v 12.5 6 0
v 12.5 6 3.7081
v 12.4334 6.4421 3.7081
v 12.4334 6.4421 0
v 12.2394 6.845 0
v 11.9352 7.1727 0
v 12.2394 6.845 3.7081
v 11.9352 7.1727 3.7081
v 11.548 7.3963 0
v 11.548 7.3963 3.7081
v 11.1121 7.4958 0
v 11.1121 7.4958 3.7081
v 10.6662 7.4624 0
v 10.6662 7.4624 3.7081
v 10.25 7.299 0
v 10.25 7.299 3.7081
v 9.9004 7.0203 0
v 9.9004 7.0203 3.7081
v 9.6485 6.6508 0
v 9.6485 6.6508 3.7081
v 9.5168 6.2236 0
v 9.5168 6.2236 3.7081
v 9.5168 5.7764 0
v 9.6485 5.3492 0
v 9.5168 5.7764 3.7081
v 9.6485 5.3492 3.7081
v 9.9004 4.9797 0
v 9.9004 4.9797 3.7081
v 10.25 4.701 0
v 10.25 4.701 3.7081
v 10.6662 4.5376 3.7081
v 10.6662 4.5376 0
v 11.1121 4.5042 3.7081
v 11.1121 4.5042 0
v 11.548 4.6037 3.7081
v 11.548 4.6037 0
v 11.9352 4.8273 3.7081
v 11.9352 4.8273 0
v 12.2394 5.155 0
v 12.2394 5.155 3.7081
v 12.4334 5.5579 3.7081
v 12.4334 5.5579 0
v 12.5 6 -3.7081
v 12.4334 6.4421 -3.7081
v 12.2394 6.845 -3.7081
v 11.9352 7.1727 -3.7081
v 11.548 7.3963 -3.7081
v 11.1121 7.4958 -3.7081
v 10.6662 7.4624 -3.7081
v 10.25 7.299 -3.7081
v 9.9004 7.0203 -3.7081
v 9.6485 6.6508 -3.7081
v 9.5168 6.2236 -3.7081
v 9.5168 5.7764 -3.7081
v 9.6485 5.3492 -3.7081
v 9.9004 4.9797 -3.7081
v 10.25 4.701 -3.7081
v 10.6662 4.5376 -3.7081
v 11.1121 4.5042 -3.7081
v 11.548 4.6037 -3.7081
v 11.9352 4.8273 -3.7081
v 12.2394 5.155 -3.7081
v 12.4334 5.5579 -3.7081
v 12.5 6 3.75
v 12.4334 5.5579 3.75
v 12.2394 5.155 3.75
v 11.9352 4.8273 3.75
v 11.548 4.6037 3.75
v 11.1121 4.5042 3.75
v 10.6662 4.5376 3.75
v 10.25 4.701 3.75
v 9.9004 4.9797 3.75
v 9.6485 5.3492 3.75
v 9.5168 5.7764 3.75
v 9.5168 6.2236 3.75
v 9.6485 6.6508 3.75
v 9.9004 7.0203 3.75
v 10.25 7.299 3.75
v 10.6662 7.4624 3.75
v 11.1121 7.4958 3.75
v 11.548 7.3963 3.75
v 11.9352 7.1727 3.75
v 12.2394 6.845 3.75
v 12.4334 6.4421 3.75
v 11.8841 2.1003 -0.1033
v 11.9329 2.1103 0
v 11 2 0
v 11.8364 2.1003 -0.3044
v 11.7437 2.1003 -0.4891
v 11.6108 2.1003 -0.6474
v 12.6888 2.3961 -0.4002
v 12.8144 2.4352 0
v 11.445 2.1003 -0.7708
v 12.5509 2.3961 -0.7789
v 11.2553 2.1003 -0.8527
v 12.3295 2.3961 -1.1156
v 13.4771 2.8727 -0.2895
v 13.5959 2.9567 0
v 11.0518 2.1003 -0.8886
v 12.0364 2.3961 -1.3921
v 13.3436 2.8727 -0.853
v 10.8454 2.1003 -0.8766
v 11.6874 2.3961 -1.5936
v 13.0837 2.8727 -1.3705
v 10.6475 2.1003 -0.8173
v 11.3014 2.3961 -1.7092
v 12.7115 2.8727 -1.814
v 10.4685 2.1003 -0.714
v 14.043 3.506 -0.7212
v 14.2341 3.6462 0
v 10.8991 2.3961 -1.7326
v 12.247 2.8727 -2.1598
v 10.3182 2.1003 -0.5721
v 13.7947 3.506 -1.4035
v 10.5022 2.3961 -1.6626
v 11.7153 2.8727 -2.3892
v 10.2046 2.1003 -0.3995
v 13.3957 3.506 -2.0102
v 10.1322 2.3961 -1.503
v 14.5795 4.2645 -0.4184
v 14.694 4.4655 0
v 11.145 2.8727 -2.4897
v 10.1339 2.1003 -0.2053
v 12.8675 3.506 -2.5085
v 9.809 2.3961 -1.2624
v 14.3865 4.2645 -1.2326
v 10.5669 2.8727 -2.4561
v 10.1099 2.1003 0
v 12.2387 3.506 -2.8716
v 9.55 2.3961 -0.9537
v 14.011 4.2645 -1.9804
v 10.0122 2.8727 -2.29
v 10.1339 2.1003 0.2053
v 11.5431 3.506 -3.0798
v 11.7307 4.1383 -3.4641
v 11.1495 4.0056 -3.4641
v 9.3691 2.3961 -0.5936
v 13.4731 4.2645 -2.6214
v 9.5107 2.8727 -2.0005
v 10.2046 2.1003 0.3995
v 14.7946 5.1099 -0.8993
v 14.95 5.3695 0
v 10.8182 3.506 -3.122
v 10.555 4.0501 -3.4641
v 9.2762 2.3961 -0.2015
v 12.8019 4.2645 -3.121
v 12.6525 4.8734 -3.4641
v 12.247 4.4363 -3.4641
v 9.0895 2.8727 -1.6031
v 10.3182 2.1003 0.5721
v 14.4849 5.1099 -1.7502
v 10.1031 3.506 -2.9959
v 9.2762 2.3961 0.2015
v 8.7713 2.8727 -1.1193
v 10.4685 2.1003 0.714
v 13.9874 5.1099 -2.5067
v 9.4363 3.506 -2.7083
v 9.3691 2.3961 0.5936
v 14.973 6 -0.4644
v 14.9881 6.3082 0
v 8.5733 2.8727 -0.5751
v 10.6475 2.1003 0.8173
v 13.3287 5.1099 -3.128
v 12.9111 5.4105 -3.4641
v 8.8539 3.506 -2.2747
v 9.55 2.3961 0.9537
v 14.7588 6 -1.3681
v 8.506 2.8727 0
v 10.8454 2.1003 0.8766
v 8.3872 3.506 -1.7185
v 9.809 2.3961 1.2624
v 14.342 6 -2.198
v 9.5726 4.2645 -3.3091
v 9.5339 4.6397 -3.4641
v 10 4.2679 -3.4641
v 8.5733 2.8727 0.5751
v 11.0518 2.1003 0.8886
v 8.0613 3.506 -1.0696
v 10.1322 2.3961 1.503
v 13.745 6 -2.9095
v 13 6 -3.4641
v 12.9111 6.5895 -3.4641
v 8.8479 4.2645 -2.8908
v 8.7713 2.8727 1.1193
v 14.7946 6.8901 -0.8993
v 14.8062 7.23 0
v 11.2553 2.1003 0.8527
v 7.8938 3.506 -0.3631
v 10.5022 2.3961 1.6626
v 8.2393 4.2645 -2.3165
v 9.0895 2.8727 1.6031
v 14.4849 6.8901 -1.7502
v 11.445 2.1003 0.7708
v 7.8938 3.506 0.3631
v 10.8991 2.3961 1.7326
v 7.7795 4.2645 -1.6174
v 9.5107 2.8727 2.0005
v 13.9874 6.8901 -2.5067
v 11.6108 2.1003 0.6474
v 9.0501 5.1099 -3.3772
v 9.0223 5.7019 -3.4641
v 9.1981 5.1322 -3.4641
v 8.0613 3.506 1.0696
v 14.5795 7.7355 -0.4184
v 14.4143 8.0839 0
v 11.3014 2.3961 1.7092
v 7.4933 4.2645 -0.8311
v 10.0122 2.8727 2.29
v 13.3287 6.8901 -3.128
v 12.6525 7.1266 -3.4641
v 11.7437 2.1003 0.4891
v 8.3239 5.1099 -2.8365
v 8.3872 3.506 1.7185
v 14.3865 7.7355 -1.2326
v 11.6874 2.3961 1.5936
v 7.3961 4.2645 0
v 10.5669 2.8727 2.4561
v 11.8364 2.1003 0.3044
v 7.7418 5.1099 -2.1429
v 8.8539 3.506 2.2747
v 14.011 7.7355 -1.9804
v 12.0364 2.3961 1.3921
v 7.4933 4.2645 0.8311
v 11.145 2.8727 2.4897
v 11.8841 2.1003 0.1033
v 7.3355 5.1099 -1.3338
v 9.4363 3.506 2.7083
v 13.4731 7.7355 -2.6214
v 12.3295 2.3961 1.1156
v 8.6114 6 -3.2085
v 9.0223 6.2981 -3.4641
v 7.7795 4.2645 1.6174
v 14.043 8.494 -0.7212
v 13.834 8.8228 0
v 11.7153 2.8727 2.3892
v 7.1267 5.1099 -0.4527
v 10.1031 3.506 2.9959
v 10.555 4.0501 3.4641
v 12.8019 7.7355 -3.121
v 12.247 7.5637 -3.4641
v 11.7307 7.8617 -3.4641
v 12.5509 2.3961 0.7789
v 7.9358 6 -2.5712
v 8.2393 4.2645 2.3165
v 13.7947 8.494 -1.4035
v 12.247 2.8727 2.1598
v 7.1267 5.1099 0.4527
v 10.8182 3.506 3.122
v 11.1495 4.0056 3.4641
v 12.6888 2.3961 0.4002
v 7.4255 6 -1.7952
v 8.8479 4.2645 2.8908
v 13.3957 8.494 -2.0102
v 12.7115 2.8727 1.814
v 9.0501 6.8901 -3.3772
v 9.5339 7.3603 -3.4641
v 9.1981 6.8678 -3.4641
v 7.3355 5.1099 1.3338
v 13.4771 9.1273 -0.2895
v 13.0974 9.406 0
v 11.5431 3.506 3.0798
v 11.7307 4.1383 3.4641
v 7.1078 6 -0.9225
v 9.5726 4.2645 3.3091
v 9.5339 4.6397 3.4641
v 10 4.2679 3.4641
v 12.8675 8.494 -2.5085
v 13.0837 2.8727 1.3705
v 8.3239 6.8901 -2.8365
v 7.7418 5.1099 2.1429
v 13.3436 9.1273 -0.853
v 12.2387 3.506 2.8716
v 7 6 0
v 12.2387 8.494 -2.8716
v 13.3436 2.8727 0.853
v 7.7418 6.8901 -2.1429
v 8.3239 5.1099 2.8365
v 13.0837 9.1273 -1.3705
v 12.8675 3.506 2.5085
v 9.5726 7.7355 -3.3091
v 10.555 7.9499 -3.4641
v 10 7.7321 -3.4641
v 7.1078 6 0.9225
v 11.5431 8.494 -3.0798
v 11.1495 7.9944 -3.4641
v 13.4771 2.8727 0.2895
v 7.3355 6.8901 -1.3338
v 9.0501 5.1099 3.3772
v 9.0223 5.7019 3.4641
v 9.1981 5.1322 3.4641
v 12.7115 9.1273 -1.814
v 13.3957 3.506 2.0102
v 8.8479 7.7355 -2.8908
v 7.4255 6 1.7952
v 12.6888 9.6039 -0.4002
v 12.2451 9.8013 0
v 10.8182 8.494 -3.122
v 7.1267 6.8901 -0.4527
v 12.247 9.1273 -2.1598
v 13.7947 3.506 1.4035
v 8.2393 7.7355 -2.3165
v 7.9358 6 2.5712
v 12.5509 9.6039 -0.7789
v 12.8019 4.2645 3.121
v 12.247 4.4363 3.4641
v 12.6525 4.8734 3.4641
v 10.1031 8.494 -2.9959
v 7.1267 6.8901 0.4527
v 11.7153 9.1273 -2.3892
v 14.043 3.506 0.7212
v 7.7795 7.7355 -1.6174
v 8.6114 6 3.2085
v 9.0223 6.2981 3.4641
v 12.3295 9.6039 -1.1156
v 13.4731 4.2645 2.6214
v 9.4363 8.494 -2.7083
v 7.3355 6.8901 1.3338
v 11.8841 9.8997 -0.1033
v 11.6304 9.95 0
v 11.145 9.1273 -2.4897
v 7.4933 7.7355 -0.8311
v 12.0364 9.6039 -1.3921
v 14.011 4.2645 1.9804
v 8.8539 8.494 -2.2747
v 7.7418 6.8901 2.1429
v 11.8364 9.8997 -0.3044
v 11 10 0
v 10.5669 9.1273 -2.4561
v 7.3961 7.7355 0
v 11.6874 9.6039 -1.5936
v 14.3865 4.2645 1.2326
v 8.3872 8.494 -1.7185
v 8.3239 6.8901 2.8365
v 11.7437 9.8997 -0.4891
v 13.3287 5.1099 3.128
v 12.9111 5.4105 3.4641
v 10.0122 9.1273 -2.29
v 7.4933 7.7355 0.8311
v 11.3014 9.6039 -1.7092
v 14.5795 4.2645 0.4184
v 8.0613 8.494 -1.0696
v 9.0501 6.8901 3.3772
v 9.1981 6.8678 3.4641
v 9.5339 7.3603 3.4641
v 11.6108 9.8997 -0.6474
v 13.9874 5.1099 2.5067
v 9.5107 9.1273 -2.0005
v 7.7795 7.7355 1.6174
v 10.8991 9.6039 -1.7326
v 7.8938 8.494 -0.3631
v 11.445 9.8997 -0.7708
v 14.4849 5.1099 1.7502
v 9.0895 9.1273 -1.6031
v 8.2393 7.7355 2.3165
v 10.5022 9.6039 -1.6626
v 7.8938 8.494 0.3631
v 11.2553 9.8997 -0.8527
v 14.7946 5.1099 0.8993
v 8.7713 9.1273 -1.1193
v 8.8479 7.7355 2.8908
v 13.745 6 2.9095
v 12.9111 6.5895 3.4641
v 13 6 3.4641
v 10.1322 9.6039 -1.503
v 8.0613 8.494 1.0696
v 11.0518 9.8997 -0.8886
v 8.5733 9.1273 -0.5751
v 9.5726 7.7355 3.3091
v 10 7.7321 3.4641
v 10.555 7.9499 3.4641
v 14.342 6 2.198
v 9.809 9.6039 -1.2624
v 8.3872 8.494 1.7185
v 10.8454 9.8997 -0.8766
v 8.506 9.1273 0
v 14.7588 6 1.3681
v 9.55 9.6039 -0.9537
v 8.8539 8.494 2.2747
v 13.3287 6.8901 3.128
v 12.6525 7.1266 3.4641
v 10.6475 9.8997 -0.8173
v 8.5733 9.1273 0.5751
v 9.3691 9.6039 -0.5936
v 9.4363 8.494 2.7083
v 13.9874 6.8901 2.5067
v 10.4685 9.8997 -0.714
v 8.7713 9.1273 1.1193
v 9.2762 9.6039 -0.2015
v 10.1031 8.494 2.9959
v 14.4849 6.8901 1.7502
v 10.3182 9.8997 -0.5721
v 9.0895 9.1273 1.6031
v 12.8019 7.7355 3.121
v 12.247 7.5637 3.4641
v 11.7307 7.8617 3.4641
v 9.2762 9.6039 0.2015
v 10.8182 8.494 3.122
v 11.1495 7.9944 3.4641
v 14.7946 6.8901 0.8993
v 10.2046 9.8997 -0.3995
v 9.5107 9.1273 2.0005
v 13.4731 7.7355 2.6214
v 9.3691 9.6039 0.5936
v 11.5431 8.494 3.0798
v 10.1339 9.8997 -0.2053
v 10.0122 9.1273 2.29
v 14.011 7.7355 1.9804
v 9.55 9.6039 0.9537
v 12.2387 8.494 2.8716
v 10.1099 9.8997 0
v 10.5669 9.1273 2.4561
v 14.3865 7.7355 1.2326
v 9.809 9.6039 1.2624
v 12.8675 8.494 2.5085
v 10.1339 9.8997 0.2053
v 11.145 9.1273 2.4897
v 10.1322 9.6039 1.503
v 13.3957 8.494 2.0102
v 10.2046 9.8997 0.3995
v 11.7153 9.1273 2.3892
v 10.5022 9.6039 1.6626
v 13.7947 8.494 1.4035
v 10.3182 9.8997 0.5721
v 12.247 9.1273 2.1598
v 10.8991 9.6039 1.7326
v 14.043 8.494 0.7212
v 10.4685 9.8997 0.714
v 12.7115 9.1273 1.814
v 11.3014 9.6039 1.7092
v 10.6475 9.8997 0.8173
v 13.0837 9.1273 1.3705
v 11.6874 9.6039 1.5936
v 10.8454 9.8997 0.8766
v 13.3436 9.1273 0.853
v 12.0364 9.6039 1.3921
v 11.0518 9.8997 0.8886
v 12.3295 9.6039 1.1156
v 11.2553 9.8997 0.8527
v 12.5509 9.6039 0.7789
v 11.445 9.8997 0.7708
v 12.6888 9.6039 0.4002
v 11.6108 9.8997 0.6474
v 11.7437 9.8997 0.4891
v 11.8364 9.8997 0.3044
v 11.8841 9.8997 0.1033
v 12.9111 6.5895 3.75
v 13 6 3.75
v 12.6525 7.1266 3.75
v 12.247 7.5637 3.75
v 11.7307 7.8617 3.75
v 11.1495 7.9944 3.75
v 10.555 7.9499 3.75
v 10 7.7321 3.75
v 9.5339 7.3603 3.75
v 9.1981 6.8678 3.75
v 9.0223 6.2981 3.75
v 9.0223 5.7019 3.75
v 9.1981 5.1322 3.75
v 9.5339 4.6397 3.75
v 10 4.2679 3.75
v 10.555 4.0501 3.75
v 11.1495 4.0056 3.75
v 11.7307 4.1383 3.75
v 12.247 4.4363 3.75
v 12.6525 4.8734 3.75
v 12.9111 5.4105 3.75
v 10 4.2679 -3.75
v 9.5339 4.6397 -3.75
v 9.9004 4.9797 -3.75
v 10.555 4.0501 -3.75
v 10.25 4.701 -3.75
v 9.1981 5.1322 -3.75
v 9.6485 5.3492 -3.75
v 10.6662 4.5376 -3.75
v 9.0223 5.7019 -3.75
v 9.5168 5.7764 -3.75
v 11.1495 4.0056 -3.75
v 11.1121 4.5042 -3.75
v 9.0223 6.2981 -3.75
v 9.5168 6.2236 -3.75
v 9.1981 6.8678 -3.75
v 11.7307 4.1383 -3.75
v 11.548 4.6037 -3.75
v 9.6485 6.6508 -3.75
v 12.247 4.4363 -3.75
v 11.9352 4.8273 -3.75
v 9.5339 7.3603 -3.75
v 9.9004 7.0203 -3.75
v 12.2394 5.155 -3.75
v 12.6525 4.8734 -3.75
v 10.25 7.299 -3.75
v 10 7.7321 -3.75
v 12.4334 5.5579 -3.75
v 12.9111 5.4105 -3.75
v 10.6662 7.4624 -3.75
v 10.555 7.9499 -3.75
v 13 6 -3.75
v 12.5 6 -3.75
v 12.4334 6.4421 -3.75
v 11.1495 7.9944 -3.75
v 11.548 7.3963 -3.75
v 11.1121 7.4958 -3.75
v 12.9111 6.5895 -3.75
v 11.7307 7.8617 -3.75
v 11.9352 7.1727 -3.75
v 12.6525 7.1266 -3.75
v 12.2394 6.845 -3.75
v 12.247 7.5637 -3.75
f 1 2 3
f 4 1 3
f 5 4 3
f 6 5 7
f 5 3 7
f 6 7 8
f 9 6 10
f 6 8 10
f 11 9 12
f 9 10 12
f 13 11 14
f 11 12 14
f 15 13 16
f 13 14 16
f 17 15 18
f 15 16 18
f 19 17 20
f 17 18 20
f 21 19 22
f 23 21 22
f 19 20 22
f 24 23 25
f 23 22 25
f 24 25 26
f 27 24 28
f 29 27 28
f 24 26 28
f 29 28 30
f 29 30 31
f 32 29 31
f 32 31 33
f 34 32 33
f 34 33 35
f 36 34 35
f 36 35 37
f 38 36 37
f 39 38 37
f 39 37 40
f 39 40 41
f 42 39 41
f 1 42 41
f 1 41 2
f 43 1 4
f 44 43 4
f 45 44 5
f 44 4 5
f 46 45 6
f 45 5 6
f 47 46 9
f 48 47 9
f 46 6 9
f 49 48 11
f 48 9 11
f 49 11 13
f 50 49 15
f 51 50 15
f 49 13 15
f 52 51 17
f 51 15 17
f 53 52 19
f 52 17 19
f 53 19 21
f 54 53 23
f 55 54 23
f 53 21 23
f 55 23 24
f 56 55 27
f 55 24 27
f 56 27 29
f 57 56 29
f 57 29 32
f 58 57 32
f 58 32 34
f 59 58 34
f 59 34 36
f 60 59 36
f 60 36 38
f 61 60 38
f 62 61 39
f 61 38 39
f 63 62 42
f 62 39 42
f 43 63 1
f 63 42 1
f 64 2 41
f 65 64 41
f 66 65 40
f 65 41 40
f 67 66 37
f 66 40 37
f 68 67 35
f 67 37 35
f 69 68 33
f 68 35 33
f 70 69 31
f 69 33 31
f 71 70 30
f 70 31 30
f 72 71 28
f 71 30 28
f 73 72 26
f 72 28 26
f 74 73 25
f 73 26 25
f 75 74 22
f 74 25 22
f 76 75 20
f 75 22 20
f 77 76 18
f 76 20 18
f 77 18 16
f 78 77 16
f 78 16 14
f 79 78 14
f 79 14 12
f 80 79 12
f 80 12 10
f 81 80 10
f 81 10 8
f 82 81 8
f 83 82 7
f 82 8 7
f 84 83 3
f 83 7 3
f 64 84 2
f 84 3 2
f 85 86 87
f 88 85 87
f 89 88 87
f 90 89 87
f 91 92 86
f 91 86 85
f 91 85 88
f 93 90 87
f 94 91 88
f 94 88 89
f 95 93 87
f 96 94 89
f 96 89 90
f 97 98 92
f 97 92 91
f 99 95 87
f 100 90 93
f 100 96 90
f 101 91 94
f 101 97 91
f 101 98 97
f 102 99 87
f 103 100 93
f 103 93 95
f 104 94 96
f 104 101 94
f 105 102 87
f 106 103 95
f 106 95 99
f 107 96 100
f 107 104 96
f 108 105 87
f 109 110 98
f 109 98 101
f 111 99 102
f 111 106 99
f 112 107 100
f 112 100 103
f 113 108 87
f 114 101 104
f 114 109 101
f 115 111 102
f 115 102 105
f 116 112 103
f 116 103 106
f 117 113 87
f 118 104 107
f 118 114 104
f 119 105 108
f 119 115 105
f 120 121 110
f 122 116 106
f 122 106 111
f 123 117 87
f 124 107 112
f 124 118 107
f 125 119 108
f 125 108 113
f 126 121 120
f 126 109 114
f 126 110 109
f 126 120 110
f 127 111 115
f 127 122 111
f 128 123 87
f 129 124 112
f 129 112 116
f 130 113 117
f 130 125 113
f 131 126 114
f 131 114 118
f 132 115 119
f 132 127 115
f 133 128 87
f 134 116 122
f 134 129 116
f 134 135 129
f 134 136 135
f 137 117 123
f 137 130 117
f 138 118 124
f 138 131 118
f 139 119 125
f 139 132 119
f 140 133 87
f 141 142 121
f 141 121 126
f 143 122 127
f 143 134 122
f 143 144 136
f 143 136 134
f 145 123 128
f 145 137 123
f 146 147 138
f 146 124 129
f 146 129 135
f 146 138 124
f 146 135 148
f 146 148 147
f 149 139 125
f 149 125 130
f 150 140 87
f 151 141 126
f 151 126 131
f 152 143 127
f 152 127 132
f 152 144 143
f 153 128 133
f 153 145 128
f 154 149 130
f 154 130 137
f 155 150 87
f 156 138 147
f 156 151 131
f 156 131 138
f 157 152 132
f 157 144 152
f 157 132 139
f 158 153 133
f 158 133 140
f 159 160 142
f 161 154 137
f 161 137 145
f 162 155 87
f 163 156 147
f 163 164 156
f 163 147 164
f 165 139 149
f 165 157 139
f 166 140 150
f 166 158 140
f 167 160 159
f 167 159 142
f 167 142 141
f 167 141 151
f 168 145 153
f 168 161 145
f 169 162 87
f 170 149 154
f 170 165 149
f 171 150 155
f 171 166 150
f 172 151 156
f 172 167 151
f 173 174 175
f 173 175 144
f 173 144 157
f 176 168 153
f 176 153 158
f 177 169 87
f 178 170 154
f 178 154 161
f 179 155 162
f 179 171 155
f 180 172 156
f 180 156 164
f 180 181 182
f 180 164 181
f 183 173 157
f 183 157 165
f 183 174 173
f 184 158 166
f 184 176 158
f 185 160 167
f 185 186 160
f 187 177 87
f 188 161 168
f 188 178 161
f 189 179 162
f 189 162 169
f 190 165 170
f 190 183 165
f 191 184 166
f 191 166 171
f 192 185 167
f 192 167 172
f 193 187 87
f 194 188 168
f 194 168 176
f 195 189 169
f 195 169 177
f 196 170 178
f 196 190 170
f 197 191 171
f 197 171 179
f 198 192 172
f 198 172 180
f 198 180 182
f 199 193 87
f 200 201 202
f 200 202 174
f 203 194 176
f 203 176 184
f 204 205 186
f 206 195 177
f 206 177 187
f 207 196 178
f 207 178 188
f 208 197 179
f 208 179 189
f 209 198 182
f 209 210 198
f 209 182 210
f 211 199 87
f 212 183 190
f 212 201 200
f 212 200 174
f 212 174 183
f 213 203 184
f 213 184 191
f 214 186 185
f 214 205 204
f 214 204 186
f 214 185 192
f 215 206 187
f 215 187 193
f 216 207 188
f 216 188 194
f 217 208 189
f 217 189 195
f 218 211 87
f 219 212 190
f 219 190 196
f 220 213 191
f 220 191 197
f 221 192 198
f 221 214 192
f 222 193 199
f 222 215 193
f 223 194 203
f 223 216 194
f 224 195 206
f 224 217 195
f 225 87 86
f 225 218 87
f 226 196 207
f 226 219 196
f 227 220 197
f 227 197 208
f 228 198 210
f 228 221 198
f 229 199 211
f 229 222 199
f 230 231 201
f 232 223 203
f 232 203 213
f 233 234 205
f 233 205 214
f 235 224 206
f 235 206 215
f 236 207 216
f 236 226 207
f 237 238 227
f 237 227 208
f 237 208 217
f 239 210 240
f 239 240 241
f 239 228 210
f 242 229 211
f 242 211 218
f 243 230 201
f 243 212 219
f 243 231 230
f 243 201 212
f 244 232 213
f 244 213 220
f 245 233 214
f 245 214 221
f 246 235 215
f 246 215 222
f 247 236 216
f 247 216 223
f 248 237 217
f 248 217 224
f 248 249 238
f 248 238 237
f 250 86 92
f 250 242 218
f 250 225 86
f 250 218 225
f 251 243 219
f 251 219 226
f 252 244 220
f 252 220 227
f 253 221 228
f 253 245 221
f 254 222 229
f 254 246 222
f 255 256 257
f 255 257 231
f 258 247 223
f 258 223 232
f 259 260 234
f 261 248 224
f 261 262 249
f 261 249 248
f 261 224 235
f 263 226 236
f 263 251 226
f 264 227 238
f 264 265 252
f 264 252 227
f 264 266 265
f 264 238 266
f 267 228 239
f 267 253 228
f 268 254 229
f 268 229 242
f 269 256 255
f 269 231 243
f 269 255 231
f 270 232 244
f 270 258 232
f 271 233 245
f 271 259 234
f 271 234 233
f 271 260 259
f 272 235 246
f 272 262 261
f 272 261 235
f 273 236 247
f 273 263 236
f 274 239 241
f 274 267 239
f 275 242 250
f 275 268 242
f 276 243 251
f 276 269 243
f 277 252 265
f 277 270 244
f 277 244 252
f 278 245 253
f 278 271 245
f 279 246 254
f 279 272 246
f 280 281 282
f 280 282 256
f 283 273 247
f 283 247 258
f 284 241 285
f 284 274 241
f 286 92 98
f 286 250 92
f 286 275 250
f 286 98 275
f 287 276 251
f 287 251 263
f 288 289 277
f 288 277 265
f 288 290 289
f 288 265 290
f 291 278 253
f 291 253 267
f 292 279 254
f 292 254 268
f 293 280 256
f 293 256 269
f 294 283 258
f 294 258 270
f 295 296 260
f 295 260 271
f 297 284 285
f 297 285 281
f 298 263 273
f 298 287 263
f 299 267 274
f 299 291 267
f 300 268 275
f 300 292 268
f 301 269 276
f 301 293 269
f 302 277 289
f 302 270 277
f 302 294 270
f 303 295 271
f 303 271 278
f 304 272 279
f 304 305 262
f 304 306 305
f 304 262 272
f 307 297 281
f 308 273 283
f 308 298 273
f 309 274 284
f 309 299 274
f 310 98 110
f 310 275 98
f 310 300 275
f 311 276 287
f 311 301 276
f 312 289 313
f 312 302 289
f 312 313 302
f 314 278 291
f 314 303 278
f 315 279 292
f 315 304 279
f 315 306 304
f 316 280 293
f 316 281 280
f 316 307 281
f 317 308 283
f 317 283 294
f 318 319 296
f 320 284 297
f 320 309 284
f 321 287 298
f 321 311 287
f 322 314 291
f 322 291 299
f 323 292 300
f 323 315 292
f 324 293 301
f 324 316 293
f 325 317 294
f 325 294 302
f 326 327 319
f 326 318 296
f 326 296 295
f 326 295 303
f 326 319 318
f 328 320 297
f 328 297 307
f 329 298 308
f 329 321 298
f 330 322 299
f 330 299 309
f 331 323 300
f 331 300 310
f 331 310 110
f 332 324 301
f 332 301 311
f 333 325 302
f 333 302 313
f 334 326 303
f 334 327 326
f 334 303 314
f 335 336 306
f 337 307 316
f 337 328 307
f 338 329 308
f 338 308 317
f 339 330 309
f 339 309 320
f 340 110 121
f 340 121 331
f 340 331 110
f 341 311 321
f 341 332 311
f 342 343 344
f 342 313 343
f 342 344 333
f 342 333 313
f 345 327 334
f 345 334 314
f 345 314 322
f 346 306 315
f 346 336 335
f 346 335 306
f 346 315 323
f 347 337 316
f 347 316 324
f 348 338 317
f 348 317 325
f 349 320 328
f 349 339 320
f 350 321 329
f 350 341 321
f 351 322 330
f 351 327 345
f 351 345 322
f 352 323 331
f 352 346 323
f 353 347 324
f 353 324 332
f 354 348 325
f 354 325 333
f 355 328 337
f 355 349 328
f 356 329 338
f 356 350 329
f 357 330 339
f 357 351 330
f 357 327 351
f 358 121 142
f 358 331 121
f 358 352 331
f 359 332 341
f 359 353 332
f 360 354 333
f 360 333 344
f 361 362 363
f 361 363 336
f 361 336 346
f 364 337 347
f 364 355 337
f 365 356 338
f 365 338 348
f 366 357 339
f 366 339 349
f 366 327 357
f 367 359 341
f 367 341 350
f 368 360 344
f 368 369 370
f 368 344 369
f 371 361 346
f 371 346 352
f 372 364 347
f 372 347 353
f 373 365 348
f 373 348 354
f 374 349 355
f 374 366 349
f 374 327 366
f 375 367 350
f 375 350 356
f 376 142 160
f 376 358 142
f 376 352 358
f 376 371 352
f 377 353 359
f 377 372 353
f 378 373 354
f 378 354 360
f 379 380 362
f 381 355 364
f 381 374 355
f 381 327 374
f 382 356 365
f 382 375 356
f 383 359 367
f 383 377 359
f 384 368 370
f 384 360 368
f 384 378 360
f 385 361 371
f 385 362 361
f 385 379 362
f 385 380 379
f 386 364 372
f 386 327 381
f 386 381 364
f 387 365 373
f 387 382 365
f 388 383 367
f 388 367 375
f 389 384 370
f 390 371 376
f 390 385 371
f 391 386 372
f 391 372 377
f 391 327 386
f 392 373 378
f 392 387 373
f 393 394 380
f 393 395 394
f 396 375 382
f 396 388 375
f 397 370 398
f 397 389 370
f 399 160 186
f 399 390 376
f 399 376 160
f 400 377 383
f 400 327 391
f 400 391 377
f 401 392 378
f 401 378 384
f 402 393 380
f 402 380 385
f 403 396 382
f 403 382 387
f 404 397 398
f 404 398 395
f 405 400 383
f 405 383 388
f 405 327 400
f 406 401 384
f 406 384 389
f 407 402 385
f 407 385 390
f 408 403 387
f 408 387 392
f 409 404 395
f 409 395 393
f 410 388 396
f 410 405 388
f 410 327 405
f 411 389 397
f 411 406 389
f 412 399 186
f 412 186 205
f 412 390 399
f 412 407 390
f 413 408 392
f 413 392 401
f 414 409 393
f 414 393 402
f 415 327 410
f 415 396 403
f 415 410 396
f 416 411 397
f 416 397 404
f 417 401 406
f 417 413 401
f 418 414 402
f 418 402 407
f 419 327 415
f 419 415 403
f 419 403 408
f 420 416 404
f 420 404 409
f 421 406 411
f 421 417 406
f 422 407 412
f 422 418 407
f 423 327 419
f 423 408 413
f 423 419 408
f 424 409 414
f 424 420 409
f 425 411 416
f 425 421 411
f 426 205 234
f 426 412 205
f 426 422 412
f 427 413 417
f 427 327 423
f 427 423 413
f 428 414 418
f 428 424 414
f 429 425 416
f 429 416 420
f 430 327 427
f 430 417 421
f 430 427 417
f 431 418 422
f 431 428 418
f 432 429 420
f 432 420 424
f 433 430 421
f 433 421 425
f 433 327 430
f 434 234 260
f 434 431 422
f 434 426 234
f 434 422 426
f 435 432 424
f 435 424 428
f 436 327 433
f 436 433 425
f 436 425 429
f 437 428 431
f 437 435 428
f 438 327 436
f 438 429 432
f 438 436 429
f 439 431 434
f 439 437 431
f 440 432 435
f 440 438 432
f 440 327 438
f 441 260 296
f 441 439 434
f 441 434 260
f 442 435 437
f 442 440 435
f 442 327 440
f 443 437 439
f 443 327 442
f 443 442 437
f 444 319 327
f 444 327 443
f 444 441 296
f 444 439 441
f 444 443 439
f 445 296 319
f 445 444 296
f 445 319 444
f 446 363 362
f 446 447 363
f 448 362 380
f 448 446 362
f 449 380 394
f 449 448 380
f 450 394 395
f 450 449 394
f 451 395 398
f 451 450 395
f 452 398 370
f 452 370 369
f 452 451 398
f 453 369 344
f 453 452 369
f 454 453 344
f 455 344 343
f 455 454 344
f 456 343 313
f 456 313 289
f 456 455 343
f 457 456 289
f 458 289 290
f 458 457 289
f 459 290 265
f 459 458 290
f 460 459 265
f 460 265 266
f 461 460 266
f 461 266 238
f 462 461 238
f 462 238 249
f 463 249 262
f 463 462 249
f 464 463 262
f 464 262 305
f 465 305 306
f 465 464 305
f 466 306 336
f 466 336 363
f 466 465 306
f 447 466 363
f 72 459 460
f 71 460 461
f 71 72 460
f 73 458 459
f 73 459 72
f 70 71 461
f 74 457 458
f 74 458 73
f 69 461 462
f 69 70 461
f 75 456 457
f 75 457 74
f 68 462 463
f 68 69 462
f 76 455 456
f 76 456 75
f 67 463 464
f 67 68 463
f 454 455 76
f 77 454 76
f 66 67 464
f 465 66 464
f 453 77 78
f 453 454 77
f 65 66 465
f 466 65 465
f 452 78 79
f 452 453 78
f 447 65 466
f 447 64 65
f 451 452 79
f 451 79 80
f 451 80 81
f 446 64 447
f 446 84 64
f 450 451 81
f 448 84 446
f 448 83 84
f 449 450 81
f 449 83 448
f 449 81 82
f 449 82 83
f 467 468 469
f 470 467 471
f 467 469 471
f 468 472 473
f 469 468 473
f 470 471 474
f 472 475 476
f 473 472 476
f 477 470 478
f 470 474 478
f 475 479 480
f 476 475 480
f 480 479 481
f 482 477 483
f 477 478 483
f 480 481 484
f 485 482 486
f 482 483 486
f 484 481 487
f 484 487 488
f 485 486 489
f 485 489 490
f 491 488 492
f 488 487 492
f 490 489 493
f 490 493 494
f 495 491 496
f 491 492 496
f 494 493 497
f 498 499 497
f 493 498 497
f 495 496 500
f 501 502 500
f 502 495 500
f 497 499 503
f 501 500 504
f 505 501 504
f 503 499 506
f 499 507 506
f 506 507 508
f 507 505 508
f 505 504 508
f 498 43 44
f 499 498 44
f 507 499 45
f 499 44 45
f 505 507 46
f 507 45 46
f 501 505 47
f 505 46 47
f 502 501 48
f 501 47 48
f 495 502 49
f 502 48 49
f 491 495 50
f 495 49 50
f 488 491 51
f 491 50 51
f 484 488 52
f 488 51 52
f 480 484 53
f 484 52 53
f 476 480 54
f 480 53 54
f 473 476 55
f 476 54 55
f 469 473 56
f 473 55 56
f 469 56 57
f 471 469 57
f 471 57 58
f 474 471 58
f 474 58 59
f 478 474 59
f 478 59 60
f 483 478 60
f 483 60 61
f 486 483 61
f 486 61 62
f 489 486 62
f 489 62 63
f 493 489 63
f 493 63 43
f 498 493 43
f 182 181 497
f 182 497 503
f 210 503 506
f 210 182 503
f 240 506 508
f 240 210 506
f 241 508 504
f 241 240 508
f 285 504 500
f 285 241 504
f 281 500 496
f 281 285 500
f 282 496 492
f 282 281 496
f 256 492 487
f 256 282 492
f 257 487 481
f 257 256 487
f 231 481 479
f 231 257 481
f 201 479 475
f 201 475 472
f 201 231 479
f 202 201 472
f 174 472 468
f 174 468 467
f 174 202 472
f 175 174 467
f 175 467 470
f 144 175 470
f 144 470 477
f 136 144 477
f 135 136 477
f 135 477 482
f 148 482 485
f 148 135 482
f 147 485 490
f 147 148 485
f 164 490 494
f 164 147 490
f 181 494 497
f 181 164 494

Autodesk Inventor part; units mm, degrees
ref_plane "YZ Plane" through (0, 0, 0) normal (1, 0, 0) x (0, 1, 0)
ref_plane "XZ Plane" through (0, 0, 0) normal (0, 1, 0) x (-1, 0, 0)
ref_plane "XY Plane" through (0, 0, 0) normal (0, 0, 1) x (1, 0, 0)
sketch "Sketch1" plane through (0, 0, 0) normal (0, 0, 1) x (1, 0, 0)
  circle A0 centre (11, 6) radius 2
  circle A1 centre (11, 6) radius 1.5
  circle A2 centre (11, 6) radius 4
  line L0 (11, 10) -> (11, 1)
  point P0 (0, 0)
  point P1 (11, 2)
  dimension "d2" = 8
  dimension "d0" = 4
  dimension "d1" = 3
revolve "Revolution1" add sketch "Sketch1" angle 360 about axis through (11, 10, 0) along (0, -1, 0) picked at (12.8166, 5.8517) picked at (14.2832, 5.555) picked at (11.4875, 6.1113) contours A0 L0 A1 | A0 L0 A2 | A1 L0
extrude "Extrusion1" cut sketch "Sketch1" along normal mid plane 10 contours L0 A1 | A1 L0
extrude "Extrusion2" add sketch "Sketch1" along normal mid plane 7.5 contours A0 L0 A1 | L0 A1 A0
properties part number "bALL"
